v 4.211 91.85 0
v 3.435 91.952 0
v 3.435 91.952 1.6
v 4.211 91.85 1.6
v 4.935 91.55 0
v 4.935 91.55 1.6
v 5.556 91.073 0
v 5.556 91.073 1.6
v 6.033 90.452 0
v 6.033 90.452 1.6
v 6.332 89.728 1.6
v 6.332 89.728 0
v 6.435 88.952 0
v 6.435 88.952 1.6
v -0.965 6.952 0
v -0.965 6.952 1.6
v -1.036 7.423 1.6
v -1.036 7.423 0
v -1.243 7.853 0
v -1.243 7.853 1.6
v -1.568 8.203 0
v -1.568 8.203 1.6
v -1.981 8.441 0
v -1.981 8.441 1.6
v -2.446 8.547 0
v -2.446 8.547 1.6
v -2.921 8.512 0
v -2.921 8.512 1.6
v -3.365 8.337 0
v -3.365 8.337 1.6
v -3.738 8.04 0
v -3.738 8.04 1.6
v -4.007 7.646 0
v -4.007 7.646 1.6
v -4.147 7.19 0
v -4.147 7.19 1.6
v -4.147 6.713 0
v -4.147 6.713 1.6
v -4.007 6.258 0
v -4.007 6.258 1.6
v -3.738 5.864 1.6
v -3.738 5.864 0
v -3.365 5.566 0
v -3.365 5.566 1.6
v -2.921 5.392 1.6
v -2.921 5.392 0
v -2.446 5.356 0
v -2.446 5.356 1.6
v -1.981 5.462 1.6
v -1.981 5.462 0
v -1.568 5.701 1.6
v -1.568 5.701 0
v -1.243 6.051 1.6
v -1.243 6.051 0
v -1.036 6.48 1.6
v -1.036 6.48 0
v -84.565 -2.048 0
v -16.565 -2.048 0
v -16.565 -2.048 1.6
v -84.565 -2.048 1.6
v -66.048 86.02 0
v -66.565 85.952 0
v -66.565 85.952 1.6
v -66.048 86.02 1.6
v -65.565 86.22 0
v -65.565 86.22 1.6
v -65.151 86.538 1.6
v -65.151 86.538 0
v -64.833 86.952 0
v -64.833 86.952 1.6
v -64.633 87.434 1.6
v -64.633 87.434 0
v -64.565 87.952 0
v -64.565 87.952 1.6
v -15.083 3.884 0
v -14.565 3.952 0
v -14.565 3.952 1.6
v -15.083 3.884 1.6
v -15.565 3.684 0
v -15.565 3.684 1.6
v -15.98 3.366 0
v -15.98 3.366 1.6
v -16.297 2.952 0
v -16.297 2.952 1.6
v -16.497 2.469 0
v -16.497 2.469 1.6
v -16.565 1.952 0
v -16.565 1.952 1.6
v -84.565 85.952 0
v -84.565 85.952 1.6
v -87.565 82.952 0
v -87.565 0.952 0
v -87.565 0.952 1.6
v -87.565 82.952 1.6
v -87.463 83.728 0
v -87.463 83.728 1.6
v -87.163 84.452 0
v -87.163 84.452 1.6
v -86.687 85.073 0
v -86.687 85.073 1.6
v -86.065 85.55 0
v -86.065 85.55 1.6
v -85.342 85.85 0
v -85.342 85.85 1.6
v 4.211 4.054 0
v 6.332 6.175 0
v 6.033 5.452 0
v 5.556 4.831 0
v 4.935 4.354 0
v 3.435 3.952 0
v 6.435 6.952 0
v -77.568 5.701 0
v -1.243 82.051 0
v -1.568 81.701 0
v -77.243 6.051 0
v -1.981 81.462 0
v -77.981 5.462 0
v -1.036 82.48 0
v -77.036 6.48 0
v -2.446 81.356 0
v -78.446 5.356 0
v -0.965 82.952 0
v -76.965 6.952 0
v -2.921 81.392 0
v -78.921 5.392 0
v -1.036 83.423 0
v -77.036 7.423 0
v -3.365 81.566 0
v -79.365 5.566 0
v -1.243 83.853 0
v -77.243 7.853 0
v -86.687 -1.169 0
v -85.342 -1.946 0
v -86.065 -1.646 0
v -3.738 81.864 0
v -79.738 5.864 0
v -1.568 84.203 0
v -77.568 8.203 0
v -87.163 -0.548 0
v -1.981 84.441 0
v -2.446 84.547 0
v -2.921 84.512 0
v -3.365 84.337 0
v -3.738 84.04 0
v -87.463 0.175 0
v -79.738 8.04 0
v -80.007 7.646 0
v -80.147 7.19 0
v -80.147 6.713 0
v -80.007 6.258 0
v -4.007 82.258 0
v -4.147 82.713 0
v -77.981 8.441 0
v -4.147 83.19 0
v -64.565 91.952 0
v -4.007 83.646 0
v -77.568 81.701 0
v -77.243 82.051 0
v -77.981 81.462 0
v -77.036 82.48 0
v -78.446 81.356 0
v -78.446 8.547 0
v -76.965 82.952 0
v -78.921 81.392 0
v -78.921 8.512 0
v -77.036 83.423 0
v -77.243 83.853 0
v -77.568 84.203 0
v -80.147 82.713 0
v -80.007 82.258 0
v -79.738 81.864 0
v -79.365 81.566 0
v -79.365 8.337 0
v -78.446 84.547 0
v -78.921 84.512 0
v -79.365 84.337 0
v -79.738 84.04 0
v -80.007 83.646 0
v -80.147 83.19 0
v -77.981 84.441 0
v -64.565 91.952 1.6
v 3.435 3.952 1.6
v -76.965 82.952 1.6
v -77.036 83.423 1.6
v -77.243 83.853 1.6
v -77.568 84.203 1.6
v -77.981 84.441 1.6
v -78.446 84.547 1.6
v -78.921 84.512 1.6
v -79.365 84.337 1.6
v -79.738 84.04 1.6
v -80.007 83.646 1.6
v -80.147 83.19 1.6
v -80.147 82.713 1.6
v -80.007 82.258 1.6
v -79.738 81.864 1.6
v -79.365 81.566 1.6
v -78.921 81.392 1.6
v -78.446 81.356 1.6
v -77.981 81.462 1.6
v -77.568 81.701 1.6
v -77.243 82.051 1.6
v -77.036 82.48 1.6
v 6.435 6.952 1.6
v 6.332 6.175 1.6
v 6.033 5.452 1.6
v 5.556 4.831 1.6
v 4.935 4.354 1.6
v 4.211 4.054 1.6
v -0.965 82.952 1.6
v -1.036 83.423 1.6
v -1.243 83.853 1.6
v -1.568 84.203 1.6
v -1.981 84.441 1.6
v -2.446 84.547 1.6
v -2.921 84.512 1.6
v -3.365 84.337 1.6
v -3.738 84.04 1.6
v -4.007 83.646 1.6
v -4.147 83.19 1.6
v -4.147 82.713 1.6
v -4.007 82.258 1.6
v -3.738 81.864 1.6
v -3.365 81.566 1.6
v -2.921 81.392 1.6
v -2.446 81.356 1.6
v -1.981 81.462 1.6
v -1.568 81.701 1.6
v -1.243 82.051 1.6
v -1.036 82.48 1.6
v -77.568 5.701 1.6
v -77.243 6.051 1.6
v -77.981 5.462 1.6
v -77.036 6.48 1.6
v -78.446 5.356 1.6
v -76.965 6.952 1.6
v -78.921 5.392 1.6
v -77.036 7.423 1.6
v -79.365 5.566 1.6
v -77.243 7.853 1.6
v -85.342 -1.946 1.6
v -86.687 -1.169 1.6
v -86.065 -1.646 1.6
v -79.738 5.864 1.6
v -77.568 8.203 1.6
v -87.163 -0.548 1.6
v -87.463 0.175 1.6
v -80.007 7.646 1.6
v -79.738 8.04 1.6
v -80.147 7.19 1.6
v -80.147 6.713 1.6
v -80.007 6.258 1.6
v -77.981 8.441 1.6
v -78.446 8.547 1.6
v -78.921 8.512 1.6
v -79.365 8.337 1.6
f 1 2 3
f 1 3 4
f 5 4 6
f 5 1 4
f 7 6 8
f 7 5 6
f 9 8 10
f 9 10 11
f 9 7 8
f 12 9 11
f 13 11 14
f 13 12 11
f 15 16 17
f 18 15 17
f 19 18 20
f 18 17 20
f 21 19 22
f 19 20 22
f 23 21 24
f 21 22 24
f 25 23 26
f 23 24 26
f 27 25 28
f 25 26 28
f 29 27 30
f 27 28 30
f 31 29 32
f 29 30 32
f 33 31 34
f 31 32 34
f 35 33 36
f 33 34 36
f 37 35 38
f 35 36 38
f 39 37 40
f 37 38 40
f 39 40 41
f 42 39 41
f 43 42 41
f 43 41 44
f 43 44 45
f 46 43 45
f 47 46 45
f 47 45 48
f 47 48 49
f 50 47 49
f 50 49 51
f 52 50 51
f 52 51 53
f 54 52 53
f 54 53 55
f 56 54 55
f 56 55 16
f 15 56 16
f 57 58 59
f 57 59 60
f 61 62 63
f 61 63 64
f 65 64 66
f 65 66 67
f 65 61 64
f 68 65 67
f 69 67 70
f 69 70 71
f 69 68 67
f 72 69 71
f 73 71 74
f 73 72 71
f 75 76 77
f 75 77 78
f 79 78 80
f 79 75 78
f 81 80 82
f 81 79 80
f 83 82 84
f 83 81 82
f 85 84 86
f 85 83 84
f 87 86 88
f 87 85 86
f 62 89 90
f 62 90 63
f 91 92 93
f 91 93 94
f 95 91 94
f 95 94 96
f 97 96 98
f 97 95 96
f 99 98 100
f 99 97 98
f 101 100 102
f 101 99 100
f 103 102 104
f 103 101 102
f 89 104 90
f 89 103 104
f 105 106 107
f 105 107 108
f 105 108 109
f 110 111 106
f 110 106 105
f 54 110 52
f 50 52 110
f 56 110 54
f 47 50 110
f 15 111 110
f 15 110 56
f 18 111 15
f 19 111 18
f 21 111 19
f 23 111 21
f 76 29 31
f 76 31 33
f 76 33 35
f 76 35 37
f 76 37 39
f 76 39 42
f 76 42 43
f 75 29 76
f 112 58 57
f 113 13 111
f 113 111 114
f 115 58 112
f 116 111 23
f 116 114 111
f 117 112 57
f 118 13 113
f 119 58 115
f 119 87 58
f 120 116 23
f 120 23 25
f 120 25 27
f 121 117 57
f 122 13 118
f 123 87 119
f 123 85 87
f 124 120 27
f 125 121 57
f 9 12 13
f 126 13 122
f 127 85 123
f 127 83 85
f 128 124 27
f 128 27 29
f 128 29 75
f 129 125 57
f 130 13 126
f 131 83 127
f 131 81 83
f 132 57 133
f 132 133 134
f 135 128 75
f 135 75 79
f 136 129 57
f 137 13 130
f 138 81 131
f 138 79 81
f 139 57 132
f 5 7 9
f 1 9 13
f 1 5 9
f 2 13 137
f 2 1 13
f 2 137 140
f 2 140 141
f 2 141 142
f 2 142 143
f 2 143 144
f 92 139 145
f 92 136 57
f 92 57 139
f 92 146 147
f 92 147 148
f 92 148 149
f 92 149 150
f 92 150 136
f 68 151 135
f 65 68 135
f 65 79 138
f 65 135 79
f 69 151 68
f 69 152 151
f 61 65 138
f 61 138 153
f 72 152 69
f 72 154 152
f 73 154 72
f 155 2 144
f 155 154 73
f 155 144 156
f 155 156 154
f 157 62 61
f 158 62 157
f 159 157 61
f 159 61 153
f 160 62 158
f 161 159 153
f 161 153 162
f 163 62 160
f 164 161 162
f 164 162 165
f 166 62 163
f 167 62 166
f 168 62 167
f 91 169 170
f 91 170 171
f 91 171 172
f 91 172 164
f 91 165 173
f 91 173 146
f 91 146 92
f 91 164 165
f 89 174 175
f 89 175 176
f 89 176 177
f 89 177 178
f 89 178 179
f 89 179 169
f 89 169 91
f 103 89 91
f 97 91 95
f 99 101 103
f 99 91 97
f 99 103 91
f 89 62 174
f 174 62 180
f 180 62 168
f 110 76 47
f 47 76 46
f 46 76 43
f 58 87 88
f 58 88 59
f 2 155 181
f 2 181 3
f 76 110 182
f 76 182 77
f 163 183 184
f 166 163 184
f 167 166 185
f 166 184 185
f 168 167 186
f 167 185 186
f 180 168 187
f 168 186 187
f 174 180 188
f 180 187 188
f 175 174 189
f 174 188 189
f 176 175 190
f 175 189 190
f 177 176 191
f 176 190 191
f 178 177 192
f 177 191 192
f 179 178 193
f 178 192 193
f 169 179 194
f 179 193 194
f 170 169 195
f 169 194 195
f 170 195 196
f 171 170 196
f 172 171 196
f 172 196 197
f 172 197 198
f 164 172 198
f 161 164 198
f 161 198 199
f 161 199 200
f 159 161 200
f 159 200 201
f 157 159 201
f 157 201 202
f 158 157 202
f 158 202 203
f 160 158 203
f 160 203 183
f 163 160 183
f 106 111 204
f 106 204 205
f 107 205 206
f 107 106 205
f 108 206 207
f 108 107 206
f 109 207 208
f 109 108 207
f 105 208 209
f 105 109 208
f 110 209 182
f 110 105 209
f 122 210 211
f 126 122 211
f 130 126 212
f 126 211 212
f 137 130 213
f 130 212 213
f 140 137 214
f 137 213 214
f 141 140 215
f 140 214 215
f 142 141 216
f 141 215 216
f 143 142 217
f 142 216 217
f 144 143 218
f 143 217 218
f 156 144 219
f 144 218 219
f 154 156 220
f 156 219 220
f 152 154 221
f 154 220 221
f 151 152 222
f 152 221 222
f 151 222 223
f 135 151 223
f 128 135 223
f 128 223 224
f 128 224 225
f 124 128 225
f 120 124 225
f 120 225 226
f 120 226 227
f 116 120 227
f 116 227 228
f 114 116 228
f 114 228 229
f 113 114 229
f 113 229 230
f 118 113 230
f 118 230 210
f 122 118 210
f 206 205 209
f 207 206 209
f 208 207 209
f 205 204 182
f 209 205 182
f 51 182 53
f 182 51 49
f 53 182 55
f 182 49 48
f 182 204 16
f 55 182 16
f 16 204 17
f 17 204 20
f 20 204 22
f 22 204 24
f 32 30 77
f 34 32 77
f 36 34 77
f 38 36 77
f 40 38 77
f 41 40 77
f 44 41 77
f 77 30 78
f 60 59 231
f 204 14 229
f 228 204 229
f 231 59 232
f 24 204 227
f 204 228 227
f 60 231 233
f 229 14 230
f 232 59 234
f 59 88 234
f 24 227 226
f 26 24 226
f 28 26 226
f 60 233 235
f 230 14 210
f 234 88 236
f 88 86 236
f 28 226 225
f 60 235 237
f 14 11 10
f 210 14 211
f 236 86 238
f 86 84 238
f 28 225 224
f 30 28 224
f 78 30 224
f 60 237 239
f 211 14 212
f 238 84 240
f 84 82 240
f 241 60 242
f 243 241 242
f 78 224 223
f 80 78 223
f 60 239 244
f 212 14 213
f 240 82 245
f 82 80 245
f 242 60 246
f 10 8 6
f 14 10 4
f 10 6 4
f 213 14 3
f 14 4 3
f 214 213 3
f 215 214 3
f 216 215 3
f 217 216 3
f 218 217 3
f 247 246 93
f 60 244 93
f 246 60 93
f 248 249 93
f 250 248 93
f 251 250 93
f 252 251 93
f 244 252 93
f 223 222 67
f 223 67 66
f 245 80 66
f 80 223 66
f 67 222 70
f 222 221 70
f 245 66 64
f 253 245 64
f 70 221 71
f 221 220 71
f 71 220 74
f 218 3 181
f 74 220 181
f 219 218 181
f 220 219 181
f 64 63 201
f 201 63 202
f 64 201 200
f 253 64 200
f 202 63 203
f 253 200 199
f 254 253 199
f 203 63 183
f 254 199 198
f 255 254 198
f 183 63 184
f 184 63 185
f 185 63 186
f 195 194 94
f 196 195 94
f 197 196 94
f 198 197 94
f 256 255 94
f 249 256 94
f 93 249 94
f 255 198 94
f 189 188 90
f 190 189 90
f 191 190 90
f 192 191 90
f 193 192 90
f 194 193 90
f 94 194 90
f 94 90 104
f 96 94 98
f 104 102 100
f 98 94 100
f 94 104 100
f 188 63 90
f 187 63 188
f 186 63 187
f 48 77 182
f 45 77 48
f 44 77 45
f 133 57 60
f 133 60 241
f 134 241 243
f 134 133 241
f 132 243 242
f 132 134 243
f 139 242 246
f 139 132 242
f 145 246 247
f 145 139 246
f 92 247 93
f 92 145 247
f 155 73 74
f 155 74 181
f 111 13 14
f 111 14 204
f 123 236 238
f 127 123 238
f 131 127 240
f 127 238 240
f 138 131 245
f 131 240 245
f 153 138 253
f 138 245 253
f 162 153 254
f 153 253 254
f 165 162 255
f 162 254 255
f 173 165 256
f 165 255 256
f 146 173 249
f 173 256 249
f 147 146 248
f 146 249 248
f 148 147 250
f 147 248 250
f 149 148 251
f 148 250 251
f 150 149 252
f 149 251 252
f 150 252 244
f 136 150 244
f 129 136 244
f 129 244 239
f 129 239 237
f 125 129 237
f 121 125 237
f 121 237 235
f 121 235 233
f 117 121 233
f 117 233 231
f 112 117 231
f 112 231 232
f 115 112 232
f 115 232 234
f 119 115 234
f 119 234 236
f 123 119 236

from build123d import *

# Parameters (mm, degrees)
BOSS_EXTRUDE1_DEPTH        = 1.6
F_3_2_3_2_DIAMETER_HOLE3_D = 3.2


with BuildPart() as part:
    # Sketch1 → Boss-Extrude1 (new body)
    with BuildSketch(Plane.XY):
        with BuildLine():
            Line((-16.56534388, -2.04814307), (-84.56534388, -2.04814307))
            ThreePointArc((-84.56534388, -2.04814307), (-86.686664224, -1.169463413), (-87.56534388, 0.95185693))
            Line((-87.56534388, 0.95185693), (-87.56534388, 82.95185693))
            ThreePointArc((-87.56534388, 82.95185693), (-86.686664224, 85.073177274), (-84.56534388, 85.95185693))
            Line((-84.56534388, 85.95185693), (-66.56534388, 85.95185693))
            ThreePointArc((-66.56534388, 85.95185693), (-65.151130318, 86.537643368), (-64.56534388, 87.95185693))
            Line((-64.56534388, 87.95185693), (-64.56534388, 91.95185693))
            Line((-64.56534388, 91.95185693), (3.43465612, 91.95185693))
            ThreePointArc((3.43465612, 91.95185693), (5.555976464, 91.073177274), (6.43465612, 88.95185693))
            Line((6.43465612, 88.95185693), (6.43465612, 6.95185693))
            ThreePointArc((6.43465612, 6.95185693), (5.555976464, 4.830536587), (3.43465612, 3.95185693))
            Line((3.43465612, 3.95185693), (-14.56534388, 3.95185693))
            ThreePointArc((-14.56534388, 3.95185693), (-15.979557442, 3.366070492), (-16.56534388, 1.95185693))
            Line((-16.56534388, 1.95185693), (-16.56534388, -2.04814307))
        make_face()
    extrude(amount=BOSS_EXTRUDE1_DEPTH)

    # Ø3.2 (3.2) Diameter Hole3 (through all)
    with Locations(Plane(origin=(0, 0, 0), x_dir=(-1, 0, 0), z_dir=(0, 0, -1))):
        with Locations((78.56534388, 6.95185693), (78.56534388, 82.95185693), (2.56534388, 82.95185693), (2.56534388, 6.95185693)):
            Hole(F_3_2_3_2_DIAMETER_HOLE3_D / 2)


solid = part.part
